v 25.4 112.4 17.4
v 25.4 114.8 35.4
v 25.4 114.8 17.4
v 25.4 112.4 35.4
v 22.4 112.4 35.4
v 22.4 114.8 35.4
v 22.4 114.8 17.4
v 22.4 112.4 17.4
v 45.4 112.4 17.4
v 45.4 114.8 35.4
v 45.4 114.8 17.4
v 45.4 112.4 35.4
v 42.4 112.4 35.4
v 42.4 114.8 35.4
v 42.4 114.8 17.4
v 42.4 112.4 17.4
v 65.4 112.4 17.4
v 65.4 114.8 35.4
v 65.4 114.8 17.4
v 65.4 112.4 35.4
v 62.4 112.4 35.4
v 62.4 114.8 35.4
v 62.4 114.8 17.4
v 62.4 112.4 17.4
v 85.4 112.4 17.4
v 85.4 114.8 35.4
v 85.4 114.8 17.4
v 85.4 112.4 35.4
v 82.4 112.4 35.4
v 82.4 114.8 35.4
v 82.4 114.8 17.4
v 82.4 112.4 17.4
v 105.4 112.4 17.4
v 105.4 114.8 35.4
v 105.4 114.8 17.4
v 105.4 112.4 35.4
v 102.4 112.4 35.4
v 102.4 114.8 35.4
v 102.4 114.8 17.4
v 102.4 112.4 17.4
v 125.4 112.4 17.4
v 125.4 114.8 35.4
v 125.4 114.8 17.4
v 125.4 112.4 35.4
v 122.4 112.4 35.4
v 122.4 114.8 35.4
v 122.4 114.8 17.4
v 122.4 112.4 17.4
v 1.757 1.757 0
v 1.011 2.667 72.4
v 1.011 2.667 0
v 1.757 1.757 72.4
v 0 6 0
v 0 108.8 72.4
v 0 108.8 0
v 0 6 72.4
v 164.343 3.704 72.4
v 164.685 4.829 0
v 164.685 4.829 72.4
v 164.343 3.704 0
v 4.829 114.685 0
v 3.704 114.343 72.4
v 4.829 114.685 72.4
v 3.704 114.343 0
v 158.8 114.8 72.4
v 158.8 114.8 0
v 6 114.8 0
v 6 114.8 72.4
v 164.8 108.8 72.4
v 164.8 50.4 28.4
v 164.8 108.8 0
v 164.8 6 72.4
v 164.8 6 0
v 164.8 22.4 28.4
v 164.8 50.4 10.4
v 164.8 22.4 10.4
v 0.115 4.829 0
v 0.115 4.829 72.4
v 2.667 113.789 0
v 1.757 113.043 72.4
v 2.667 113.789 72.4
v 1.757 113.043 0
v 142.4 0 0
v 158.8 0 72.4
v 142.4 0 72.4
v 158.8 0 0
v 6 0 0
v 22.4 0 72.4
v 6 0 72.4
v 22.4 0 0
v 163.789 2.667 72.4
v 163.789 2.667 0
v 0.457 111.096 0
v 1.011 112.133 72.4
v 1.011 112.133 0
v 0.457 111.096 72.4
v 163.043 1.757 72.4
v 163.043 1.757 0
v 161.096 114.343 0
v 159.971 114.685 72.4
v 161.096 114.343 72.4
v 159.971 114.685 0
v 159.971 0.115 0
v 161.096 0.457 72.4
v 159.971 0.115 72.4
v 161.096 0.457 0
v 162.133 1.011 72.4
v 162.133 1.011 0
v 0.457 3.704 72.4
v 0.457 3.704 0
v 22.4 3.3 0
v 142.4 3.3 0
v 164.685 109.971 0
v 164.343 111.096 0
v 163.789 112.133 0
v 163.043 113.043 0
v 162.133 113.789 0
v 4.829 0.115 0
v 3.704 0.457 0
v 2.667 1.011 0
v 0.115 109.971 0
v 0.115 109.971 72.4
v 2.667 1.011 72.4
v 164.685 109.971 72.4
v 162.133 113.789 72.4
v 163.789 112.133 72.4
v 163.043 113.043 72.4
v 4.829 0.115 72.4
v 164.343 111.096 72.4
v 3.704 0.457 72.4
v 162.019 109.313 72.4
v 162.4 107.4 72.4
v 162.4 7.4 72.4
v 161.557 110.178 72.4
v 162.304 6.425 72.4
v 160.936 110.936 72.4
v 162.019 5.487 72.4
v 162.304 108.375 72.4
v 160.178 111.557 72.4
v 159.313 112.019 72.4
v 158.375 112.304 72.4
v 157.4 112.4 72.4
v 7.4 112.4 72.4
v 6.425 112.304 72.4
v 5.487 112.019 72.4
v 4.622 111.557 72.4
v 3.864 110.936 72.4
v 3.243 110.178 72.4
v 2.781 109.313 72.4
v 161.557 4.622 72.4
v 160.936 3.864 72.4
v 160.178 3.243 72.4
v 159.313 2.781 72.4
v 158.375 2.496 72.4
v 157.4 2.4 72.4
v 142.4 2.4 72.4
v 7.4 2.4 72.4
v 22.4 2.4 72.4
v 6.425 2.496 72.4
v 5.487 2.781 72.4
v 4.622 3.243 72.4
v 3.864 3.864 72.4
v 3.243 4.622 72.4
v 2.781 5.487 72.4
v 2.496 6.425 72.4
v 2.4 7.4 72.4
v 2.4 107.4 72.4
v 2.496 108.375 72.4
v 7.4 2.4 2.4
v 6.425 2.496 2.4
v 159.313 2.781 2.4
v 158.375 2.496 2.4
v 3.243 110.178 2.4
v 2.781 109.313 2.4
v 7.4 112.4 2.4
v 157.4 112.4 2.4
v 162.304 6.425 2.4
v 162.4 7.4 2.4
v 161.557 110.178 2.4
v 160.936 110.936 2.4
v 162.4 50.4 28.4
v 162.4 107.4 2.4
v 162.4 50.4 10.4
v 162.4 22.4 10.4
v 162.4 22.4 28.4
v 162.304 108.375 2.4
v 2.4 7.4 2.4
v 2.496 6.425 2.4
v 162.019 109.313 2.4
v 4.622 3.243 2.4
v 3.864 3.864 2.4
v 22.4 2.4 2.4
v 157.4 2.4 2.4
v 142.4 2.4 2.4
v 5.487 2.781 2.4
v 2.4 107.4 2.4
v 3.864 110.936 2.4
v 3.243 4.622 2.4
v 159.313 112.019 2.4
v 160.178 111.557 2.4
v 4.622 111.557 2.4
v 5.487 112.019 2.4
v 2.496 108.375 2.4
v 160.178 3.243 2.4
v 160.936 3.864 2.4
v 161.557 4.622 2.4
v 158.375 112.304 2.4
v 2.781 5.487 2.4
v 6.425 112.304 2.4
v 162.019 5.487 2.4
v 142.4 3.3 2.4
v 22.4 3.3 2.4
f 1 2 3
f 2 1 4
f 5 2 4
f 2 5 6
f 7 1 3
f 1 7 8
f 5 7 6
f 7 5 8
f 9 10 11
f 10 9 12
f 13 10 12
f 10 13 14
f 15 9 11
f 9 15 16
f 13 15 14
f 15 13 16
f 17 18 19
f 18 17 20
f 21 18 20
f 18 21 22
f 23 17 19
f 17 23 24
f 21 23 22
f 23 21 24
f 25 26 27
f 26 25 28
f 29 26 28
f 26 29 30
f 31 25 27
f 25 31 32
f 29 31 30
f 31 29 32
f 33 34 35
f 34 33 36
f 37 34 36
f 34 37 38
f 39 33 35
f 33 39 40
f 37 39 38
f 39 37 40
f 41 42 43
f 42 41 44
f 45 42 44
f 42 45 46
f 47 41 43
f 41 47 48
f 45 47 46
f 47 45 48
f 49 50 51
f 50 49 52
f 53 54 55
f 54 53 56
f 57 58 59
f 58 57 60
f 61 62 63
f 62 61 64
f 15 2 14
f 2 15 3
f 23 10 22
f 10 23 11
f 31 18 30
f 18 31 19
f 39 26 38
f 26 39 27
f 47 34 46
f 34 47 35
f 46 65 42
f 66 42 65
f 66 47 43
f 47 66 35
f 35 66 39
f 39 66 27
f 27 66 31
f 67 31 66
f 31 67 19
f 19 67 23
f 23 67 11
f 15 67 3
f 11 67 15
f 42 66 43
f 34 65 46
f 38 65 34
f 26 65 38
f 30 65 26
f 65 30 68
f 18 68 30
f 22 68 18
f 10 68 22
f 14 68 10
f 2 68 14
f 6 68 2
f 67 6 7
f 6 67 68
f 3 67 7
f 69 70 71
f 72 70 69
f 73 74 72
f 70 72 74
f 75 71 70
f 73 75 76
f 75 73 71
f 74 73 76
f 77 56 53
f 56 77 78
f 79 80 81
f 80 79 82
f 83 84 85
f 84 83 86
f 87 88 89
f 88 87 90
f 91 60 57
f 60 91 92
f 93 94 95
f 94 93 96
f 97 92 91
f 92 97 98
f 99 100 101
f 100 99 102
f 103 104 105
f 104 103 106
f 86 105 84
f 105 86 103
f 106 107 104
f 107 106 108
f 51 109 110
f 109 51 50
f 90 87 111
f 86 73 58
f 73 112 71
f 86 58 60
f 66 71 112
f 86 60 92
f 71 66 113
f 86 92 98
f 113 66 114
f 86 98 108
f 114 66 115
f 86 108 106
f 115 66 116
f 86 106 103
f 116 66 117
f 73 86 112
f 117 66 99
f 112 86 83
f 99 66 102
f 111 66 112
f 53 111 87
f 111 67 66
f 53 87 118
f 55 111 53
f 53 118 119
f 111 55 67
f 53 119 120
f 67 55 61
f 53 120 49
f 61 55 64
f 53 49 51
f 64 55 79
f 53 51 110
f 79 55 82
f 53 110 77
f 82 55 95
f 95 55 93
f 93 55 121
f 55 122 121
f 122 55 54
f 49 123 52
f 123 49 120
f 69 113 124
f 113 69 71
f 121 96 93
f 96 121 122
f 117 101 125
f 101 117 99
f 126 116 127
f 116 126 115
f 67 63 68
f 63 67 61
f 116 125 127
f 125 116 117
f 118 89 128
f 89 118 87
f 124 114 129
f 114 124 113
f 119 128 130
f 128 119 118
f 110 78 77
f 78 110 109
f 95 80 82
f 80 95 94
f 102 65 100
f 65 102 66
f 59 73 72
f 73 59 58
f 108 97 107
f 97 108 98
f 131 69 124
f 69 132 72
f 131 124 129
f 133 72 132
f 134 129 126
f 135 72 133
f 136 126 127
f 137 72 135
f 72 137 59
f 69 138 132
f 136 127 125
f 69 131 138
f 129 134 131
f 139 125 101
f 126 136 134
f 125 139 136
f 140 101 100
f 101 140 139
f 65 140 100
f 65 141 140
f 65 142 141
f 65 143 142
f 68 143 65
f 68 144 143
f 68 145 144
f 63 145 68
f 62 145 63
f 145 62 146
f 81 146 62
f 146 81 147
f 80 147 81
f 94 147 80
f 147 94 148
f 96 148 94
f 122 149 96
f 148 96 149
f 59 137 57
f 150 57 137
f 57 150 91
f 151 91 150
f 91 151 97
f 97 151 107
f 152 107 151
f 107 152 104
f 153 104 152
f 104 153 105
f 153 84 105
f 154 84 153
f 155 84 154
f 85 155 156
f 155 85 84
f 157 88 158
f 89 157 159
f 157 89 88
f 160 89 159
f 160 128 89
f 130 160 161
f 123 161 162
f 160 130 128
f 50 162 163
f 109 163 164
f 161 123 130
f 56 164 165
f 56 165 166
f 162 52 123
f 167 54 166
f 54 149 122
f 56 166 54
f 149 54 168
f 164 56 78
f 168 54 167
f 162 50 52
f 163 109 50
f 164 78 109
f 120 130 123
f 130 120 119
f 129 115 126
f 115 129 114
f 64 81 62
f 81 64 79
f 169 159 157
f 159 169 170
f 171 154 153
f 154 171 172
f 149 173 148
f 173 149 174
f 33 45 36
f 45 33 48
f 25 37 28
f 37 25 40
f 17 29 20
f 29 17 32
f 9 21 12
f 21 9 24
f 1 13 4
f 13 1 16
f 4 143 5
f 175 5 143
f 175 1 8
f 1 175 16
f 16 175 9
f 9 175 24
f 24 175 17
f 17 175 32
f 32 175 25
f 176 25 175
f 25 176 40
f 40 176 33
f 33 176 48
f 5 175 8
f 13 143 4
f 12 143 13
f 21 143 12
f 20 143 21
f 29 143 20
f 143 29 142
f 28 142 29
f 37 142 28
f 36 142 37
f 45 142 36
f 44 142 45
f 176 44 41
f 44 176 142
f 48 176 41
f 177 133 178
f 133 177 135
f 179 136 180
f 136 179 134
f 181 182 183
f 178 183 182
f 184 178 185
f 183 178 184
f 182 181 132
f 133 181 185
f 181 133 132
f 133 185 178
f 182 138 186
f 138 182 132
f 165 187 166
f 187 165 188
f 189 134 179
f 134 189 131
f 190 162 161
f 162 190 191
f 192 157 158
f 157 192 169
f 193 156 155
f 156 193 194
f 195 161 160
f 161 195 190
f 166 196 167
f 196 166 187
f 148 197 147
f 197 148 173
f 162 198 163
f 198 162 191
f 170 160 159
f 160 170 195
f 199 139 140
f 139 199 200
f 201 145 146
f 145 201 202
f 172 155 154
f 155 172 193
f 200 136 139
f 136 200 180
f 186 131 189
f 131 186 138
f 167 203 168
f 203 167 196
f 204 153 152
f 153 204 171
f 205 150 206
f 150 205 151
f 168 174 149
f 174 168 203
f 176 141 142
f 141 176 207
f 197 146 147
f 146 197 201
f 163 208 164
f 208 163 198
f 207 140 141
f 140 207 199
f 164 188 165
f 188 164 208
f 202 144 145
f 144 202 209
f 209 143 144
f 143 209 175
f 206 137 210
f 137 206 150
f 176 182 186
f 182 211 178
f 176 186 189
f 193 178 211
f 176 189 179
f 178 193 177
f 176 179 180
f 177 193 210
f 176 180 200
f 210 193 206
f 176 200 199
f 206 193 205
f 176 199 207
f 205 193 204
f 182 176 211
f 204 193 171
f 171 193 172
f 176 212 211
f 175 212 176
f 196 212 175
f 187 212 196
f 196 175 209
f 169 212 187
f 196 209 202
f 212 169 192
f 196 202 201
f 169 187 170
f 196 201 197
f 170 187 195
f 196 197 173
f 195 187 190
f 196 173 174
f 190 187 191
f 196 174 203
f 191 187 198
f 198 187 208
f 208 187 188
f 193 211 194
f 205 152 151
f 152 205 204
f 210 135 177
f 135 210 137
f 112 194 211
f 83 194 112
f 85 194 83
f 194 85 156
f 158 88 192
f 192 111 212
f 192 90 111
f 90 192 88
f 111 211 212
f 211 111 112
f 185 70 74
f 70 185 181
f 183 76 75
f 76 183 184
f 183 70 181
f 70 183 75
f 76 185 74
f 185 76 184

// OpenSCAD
// Parametric draft enclosure for home-ai-speaker
// Units: millimeters. Export STL from OpenSCAD after tuning.

wall = 2.4;
inner_w = 160;
inner_d = 110;
inner_h = 70;
screen_w = 120;
screen_h = 75;
screen_bezel = 3;
vent_slot_w = 3;
vent_slot_h = 18;
corner_r = 6;

module rounded_box(w, d, h, r) {
  hull() {
    for (x = [r, w - r])
      for (y = [r, d - r])
        translate([x, y, 0])
          cylinder(h=h, r=r, $fn=32);
  }
}

module shell() {
  difference() {
    rounded_box(inner_w + 2 * wall, inner_d + 2 * wall, inner_h + wall, corner_r);
    translate([wall, wall, wall])
      rounded_box(inner_w, inner_d, inner_h + 1, corner_r - 1);

    // Screen window (front = Y min)
    translate([
      (inner_w + 2 * wall - screen_w) / 2,
      -0.1,
      wall + (inner_h - screen_h) / 2
    ])
      cube([screen_w, wall + 1, screen_h]);

    // Rear vents
    for (i = [0:5]) {
      translate([
        wall + 20 + i * 20,
        inner_d + wall - 0.1,
        wall + 15
      ])
        cube([vent_slot_w, wall + 1, vent_slot_h]);
    }

    // Cable pass (USB / power)
    translate([inner_w + wall - 1, wall + 20, wall + 8])
      cube([wall + 2, 28, 18]);
  }
}

shell();

// Optional: board placeholder (not printed — preview only)
%translate([wall + 30, wall + 25, wall + 2])
  cube([85, 56, 18]);
